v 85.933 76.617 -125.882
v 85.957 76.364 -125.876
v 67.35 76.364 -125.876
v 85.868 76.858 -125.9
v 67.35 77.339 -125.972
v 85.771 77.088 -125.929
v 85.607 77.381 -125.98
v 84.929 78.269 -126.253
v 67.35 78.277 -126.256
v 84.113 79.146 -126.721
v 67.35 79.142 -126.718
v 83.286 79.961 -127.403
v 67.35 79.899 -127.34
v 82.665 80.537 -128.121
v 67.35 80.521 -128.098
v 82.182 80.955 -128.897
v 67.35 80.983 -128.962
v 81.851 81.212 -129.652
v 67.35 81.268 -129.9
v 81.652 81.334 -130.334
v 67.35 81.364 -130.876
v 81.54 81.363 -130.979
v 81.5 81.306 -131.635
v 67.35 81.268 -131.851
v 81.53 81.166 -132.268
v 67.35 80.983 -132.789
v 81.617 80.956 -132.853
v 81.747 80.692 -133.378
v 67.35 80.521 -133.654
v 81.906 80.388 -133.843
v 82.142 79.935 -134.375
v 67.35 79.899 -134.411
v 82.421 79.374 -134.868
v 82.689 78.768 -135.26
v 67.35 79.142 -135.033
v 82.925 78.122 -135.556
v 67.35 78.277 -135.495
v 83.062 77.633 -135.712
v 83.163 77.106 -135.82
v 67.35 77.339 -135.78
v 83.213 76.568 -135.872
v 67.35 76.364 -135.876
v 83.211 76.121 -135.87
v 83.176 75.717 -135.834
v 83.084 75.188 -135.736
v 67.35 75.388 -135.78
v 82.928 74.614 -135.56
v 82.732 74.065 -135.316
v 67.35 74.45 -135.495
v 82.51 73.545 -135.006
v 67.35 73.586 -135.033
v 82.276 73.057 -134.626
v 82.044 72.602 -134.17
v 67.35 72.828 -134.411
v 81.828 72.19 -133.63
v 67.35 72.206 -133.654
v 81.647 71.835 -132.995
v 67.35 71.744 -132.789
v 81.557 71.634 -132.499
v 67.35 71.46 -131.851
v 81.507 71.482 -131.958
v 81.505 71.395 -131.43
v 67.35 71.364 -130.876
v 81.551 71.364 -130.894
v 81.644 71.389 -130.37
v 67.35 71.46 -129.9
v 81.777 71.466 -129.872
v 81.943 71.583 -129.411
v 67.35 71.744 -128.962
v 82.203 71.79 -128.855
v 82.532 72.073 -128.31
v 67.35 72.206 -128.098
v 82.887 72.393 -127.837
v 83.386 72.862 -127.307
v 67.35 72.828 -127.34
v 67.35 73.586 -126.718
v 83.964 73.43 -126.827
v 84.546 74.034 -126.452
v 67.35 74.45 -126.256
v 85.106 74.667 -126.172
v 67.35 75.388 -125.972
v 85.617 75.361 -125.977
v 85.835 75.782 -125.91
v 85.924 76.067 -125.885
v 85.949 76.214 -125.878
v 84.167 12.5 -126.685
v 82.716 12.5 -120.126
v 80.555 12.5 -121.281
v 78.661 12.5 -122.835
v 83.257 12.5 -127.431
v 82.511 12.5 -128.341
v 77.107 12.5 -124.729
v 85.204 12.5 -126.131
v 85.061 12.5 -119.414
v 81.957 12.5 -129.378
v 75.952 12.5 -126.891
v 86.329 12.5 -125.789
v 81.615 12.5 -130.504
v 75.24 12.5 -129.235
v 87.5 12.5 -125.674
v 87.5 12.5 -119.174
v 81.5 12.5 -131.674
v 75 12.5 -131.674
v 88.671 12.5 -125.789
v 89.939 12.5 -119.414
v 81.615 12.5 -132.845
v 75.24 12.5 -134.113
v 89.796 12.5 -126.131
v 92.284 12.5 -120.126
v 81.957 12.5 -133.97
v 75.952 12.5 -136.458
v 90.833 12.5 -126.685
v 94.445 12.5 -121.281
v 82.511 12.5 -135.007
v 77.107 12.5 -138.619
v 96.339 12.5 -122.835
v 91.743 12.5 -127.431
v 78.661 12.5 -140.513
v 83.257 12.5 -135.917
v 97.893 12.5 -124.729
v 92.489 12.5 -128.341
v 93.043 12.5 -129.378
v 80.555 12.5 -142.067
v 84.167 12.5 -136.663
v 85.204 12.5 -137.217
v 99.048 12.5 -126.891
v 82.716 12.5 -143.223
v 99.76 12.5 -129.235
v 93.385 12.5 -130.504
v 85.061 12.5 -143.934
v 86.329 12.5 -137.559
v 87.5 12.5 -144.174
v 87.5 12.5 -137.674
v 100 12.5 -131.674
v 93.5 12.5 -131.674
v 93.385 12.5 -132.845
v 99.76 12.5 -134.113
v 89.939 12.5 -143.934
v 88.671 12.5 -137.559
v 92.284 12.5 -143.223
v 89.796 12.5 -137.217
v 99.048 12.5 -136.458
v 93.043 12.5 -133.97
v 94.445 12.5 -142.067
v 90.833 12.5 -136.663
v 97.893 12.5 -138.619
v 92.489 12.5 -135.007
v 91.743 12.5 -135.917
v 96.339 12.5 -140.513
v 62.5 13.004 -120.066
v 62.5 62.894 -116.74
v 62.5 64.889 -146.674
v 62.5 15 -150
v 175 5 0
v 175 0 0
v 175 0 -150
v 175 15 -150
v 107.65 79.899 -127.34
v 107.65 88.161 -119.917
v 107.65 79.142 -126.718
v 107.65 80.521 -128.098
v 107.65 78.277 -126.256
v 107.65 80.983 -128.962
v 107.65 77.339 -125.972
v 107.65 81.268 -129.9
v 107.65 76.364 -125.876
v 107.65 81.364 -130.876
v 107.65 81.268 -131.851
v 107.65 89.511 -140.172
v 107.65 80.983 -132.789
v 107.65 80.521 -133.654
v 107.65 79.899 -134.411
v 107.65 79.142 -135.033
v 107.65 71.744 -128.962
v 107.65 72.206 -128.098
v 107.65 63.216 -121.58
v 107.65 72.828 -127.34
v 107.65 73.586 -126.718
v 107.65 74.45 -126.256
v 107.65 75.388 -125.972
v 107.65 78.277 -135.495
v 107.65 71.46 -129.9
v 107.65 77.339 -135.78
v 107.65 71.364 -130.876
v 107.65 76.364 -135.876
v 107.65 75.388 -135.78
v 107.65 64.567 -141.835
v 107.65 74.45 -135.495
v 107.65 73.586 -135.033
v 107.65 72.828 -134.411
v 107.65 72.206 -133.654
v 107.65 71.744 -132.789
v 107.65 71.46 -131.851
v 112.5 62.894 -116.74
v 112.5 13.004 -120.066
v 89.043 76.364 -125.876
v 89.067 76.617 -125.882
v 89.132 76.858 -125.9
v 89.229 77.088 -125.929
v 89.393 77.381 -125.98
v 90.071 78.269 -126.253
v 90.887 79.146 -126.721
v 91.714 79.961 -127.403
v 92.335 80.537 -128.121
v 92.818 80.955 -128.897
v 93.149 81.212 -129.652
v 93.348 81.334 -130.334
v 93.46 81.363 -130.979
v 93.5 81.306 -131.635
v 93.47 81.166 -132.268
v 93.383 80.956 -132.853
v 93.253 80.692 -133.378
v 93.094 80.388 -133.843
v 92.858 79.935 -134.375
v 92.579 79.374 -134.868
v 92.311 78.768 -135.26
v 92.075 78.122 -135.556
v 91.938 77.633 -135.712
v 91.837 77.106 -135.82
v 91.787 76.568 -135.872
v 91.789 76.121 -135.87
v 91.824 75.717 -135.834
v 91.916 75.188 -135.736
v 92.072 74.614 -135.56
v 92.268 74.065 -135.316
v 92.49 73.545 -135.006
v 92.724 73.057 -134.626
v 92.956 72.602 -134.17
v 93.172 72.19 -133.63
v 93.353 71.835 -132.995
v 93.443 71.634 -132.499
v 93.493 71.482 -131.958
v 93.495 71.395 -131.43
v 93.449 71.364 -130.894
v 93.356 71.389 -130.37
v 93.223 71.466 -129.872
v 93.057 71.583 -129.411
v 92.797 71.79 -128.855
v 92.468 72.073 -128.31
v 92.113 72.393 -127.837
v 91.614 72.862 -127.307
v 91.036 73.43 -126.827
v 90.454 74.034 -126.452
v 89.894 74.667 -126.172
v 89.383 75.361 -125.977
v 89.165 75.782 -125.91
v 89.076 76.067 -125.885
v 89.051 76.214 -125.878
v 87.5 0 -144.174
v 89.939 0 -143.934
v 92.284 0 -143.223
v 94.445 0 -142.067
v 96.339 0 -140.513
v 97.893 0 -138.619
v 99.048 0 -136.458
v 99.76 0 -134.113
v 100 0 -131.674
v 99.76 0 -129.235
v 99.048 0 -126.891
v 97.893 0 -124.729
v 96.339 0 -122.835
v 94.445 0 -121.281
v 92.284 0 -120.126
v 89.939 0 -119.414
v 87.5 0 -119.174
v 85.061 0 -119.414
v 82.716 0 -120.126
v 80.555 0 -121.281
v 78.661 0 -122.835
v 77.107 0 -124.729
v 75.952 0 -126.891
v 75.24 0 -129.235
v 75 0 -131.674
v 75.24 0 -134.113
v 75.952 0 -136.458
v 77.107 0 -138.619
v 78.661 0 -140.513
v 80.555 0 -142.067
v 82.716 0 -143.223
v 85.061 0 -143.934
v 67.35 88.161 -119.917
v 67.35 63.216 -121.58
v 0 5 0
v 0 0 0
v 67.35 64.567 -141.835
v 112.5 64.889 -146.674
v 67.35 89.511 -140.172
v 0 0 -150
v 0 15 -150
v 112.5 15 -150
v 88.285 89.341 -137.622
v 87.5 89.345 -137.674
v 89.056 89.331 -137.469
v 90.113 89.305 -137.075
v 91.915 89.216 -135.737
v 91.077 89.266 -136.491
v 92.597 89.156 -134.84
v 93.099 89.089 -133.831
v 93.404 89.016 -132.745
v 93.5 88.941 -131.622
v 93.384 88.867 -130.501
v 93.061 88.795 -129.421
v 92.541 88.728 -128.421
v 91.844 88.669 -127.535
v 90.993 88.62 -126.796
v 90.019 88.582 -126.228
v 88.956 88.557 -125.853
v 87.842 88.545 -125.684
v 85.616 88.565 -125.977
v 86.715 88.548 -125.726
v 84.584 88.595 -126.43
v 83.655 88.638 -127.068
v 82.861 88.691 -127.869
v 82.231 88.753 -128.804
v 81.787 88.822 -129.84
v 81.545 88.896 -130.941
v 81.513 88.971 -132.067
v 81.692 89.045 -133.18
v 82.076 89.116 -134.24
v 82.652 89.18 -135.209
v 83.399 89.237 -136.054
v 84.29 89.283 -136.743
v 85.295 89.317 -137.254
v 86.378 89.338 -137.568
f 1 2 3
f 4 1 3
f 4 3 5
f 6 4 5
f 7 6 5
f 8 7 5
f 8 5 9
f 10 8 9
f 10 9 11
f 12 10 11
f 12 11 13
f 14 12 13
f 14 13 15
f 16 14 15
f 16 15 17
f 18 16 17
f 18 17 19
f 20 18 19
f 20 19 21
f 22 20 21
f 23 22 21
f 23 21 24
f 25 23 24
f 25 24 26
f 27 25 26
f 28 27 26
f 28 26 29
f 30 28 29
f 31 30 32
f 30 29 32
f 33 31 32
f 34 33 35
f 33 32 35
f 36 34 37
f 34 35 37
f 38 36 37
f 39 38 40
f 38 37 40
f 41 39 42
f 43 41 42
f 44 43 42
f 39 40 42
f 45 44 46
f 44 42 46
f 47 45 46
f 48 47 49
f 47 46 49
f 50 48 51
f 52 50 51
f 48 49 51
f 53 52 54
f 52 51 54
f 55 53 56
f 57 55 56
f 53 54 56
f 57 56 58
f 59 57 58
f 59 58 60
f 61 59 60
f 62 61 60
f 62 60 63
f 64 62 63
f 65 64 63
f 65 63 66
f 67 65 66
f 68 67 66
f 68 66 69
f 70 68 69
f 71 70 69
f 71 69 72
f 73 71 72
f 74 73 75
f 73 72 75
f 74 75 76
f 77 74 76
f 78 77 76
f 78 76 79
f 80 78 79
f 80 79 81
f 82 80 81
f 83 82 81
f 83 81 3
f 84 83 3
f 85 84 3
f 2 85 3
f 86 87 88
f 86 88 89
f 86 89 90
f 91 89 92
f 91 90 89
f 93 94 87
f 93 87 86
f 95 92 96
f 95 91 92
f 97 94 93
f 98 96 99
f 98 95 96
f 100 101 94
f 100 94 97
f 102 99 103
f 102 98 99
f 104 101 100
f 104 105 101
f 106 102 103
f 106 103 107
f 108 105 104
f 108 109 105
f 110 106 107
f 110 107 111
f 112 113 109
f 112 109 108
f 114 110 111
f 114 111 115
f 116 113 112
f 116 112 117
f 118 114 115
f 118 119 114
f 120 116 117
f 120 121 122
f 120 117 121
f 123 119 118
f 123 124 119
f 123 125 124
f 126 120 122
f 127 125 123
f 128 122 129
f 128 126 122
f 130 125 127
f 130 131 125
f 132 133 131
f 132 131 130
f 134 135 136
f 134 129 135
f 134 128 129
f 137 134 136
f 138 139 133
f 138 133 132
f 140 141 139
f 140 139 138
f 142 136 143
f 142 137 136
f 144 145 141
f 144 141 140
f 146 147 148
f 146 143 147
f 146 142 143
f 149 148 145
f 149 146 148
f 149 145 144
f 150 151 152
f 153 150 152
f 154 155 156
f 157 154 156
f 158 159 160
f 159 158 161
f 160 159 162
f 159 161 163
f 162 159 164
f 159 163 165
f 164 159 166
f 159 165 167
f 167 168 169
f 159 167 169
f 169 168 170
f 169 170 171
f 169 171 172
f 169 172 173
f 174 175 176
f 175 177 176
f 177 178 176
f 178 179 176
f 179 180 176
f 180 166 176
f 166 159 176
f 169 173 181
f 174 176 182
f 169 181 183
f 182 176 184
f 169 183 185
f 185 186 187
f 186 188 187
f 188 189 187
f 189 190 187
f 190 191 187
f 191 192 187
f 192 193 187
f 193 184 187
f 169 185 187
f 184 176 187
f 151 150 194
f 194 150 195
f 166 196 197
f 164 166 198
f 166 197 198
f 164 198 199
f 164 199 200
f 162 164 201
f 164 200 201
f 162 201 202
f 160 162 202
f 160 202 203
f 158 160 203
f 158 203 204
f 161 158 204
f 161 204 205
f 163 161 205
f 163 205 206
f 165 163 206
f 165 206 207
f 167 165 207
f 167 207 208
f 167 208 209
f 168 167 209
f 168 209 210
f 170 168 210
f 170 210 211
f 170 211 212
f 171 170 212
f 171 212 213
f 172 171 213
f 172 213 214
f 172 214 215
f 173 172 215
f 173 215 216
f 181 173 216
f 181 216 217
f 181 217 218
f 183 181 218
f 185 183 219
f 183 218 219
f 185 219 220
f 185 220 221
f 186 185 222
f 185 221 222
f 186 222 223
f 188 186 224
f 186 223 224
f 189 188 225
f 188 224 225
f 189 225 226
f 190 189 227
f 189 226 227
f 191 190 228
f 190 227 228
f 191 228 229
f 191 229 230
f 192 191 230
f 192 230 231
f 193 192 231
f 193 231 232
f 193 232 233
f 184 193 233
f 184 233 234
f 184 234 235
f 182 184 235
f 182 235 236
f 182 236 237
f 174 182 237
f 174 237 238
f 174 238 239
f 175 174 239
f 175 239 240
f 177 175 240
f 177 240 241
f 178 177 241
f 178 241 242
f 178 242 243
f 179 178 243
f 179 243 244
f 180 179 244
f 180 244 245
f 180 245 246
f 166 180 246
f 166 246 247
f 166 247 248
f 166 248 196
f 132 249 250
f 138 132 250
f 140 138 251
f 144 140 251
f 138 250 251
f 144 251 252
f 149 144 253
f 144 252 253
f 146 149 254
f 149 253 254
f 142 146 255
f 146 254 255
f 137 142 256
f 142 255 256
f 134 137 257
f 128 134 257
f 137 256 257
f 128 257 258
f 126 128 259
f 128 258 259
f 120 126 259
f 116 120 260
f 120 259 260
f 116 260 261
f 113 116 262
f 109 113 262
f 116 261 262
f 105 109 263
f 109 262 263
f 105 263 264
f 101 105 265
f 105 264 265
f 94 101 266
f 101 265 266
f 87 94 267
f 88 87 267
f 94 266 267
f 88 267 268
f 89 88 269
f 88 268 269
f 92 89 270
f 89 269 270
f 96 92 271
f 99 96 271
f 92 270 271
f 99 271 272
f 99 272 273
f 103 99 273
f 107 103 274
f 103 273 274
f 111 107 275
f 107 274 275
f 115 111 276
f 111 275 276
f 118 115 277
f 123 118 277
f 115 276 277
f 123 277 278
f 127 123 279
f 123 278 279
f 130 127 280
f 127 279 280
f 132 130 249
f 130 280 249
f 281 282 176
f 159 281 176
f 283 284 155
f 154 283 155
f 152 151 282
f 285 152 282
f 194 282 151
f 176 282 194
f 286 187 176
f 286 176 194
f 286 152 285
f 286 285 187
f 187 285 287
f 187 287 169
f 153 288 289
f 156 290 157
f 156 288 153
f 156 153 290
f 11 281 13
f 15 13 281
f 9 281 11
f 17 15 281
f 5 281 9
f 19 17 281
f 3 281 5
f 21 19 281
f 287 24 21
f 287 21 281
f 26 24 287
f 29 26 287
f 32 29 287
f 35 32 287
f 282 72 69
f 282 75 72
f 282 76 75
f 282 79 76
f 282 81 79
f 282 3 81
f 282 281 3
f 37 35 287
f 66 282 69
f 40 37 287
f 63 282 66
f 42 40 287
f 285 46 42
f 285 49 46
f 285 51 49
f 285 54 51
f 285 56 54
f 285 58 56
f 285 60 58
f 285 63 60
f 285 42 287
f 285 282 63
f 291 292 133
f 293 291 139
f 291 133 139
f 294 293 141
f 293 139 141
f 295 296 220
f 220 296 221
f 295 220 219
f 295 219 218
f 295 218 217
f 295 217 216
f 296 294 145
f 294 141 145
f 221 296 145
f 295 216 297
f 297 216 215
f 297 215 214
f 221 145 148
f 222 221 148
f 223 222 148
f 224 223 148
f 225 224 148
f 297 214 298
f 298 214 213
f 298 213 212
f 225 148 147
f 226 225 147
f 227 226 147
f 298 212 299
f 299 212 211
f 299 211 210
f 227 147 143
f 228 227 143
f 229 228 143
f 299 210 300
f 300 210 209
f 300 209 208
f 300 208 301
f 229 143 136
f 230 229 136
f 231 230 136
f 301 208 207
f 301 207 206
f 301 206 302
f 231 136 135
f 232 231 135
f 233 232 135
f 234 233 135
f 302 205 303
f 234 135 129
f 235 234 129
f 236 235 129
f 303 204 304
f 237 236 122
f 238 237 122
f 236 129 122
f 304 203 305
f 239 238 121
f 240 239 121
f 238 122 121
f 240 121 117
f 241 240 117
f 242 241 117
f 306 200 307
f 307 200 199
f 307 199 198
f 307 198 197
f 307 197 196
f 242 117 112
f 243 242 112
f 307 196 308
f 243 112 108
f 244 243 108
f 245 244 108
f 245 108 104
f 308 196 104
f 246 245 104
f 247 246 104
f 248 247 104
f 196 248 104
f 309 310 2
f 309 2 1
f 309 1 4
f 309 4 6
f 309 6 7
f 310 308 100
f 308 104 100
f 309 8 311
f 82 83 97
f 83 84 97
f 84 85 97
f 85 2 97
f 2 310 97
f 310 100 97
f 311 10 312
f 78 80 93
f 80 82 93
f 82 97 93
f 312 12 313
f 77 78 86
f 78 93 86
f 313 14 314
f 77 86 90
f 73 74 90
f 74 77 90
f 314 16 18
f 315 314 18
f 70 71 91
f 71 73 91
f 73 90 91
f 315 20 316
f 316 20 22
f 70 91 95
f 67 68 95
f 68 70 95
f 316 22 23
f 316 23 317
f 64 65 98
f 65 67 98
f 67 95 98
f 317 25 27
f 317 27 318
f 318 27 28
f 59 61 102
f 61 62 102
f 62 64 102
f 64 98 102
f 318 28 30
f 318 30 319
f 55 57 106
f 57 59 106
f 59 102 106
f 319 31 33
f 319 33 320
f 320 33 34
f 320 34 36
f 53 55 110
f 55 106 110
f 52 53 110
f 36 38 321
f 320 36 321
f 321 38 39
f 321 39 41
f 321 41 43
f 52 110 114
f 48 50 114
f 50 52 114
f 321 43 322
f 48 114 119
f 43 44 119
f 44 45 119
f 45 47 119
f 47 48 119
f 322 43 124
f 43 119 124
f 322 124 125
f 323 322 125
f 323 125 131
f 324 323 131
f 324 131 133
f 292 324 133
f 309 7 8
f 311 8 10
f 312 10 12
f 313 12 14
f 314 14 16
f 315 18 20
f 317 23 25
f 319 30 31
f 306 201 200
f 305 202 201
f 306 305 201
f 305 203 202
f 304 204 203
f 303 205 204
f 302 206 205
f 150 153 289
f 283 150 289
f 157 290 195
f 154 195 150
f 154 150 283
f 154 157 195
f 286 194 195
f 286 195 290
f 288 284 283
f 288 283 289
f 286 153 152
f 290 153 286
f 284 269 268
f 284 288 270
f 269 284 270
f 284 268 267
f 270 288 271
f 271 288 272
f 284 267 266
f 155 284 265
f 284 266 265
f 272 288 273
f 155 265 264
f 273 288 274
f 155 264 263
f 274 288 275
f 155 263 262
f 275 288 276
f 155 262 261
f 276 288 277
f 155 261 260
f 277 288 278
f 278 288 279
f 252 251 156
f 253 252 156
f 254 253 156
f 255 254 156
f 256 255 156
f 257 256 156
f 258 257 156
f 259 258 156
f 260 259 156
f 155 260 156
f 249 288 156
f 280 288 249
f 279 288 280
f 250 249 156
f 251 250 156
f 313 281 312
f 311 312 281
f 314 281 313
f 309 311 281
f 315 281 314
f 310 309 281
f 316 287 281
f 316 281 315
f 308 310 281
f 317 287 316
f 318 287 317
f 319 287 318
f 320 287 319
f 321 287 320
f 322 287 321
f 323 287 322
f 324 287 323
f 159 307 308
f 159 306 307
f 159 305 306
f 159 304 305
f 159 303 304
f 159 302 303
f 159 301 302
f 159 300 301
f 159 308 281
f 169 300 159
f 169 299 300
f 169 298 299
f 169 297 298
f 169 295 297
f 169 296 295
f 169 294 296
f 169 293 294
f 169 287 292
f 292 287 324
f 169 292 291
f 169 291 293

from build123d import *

# Parameters (mm, degrees)
SKETCH1_W           = 175
SKETCH1_H           = 150
BOSS_EXTRUDE1_DEPTH = 15
CUT_EXTRUDE1_DEPTH  = 231.976189249
SKETCH3_W           = 50
SKETCH3_H           = 30
BOSS_EXTRUDE2_DEPTH = 50
SKETCH4_W           = 40.3
SKETCH4_H           = 20.3
BOSS_EXTRUDE3_DEPTH = 25
SKETCH5_R           = 5
CUT_EXTRUDE3_DEPTH  = 206.184770127
SKETCH7_R           = 6
CUT_EXTRUDE5_DEPTH  = 248.25951426
SKETCH8_R           = 12.5
CUT_EXTRUDE6_DEPTH  = 12.5


with BuildPart() as part:
    # Sketch1 → Boss-Extrude1 (new body)
    with BuildSketch(Plane(origin=(0, 0, 0), x_dir=(1, 0, 0), z_dir=(0, 1, 0))):
        with Locations((87.5, 75)):
            Rectangle(SKETCH1_W, SKETCH1_H)
    extrude(amount=BOSS_EXTRUDE1_DEPTH)

    # Sketch2 → Cut-Extrude1 (cut, through all)
    with BuildSketch(Plane(origin=(175, 0, 0), x_dir=(0, 0, -1), z_dir=(1, 0, 0))):
        Polygon((150, 15), (0, 5), (0, 15), align=None)
    extrude(amount=-CUT_EXTRUDE1_DEPTH, mode=Mode.SUBTRACT)

    # Sketch3 → Boss-Extrude2 (add)
    with BuildSketch(Plane(origin=(0, 4.977876106, 0.331858407), x_dir=(1, 0, 0), z_dir=(0, 0.997785157856609, 0.06651901052377394))):
        with Locations((87.5, 135.665558836)):
            Rectangle(SKETCH3_W, SKETCH3_H)
    extrude(amount=BOSS_EXTRUDE2_DEPTH)

    # Sketch4 → Boss-Extrude3 (add)
    with BuildSketch(Plane(origin=(0, 54.867133999, 3.657808933), x_dir=(1, 0, 0), z_dir=(0, 0.997785157856609, 0.0665190105237739))):
        with Locations((87.5, 135.665558836)):
            Rectangle(SKETCH4_W, SKETCH4_H)
    extrude(amount=BOSS_EXTRUDE3_DEPTH)

    # Sketch5 → Cut-Extrude3 (cut, through all)
    with BuildSketch(Plane.ZY.offset(-67.35)):
        with Locations((-130.875784474, 76.363787208)):
            Circle(SKETCH5_R)
    extrude(amount=-CUT_EXTRUDE3_DEPTH, mode=Mode.SUBTRACT)

    # Sketch7 → Cut-Extrude5 (cut, through all)
    with BuildSketch(Plane.XZ):
        with Locations(Location((87.5, -131.674049474, 0), (0, 0, 270))):
            Circle(SKETCH7_R)
    extrude(amount=-CUT_EXTRUDE5_DEPTH, mode=Mode.SUBTRACT)

    # Sketch8 → Cut-Extrude6 (cut)
    with BuildSketch(Plane.XZ):
        with Locations(Location((87.5, -131.674049474, 0), (0, 0, 270))):
            Circle(SKETCH8_R)
    extrude(amount=-CUT_EXTRUDE6_DEPTH, mode=Mode.SUBTRACT)


solid = part.part
